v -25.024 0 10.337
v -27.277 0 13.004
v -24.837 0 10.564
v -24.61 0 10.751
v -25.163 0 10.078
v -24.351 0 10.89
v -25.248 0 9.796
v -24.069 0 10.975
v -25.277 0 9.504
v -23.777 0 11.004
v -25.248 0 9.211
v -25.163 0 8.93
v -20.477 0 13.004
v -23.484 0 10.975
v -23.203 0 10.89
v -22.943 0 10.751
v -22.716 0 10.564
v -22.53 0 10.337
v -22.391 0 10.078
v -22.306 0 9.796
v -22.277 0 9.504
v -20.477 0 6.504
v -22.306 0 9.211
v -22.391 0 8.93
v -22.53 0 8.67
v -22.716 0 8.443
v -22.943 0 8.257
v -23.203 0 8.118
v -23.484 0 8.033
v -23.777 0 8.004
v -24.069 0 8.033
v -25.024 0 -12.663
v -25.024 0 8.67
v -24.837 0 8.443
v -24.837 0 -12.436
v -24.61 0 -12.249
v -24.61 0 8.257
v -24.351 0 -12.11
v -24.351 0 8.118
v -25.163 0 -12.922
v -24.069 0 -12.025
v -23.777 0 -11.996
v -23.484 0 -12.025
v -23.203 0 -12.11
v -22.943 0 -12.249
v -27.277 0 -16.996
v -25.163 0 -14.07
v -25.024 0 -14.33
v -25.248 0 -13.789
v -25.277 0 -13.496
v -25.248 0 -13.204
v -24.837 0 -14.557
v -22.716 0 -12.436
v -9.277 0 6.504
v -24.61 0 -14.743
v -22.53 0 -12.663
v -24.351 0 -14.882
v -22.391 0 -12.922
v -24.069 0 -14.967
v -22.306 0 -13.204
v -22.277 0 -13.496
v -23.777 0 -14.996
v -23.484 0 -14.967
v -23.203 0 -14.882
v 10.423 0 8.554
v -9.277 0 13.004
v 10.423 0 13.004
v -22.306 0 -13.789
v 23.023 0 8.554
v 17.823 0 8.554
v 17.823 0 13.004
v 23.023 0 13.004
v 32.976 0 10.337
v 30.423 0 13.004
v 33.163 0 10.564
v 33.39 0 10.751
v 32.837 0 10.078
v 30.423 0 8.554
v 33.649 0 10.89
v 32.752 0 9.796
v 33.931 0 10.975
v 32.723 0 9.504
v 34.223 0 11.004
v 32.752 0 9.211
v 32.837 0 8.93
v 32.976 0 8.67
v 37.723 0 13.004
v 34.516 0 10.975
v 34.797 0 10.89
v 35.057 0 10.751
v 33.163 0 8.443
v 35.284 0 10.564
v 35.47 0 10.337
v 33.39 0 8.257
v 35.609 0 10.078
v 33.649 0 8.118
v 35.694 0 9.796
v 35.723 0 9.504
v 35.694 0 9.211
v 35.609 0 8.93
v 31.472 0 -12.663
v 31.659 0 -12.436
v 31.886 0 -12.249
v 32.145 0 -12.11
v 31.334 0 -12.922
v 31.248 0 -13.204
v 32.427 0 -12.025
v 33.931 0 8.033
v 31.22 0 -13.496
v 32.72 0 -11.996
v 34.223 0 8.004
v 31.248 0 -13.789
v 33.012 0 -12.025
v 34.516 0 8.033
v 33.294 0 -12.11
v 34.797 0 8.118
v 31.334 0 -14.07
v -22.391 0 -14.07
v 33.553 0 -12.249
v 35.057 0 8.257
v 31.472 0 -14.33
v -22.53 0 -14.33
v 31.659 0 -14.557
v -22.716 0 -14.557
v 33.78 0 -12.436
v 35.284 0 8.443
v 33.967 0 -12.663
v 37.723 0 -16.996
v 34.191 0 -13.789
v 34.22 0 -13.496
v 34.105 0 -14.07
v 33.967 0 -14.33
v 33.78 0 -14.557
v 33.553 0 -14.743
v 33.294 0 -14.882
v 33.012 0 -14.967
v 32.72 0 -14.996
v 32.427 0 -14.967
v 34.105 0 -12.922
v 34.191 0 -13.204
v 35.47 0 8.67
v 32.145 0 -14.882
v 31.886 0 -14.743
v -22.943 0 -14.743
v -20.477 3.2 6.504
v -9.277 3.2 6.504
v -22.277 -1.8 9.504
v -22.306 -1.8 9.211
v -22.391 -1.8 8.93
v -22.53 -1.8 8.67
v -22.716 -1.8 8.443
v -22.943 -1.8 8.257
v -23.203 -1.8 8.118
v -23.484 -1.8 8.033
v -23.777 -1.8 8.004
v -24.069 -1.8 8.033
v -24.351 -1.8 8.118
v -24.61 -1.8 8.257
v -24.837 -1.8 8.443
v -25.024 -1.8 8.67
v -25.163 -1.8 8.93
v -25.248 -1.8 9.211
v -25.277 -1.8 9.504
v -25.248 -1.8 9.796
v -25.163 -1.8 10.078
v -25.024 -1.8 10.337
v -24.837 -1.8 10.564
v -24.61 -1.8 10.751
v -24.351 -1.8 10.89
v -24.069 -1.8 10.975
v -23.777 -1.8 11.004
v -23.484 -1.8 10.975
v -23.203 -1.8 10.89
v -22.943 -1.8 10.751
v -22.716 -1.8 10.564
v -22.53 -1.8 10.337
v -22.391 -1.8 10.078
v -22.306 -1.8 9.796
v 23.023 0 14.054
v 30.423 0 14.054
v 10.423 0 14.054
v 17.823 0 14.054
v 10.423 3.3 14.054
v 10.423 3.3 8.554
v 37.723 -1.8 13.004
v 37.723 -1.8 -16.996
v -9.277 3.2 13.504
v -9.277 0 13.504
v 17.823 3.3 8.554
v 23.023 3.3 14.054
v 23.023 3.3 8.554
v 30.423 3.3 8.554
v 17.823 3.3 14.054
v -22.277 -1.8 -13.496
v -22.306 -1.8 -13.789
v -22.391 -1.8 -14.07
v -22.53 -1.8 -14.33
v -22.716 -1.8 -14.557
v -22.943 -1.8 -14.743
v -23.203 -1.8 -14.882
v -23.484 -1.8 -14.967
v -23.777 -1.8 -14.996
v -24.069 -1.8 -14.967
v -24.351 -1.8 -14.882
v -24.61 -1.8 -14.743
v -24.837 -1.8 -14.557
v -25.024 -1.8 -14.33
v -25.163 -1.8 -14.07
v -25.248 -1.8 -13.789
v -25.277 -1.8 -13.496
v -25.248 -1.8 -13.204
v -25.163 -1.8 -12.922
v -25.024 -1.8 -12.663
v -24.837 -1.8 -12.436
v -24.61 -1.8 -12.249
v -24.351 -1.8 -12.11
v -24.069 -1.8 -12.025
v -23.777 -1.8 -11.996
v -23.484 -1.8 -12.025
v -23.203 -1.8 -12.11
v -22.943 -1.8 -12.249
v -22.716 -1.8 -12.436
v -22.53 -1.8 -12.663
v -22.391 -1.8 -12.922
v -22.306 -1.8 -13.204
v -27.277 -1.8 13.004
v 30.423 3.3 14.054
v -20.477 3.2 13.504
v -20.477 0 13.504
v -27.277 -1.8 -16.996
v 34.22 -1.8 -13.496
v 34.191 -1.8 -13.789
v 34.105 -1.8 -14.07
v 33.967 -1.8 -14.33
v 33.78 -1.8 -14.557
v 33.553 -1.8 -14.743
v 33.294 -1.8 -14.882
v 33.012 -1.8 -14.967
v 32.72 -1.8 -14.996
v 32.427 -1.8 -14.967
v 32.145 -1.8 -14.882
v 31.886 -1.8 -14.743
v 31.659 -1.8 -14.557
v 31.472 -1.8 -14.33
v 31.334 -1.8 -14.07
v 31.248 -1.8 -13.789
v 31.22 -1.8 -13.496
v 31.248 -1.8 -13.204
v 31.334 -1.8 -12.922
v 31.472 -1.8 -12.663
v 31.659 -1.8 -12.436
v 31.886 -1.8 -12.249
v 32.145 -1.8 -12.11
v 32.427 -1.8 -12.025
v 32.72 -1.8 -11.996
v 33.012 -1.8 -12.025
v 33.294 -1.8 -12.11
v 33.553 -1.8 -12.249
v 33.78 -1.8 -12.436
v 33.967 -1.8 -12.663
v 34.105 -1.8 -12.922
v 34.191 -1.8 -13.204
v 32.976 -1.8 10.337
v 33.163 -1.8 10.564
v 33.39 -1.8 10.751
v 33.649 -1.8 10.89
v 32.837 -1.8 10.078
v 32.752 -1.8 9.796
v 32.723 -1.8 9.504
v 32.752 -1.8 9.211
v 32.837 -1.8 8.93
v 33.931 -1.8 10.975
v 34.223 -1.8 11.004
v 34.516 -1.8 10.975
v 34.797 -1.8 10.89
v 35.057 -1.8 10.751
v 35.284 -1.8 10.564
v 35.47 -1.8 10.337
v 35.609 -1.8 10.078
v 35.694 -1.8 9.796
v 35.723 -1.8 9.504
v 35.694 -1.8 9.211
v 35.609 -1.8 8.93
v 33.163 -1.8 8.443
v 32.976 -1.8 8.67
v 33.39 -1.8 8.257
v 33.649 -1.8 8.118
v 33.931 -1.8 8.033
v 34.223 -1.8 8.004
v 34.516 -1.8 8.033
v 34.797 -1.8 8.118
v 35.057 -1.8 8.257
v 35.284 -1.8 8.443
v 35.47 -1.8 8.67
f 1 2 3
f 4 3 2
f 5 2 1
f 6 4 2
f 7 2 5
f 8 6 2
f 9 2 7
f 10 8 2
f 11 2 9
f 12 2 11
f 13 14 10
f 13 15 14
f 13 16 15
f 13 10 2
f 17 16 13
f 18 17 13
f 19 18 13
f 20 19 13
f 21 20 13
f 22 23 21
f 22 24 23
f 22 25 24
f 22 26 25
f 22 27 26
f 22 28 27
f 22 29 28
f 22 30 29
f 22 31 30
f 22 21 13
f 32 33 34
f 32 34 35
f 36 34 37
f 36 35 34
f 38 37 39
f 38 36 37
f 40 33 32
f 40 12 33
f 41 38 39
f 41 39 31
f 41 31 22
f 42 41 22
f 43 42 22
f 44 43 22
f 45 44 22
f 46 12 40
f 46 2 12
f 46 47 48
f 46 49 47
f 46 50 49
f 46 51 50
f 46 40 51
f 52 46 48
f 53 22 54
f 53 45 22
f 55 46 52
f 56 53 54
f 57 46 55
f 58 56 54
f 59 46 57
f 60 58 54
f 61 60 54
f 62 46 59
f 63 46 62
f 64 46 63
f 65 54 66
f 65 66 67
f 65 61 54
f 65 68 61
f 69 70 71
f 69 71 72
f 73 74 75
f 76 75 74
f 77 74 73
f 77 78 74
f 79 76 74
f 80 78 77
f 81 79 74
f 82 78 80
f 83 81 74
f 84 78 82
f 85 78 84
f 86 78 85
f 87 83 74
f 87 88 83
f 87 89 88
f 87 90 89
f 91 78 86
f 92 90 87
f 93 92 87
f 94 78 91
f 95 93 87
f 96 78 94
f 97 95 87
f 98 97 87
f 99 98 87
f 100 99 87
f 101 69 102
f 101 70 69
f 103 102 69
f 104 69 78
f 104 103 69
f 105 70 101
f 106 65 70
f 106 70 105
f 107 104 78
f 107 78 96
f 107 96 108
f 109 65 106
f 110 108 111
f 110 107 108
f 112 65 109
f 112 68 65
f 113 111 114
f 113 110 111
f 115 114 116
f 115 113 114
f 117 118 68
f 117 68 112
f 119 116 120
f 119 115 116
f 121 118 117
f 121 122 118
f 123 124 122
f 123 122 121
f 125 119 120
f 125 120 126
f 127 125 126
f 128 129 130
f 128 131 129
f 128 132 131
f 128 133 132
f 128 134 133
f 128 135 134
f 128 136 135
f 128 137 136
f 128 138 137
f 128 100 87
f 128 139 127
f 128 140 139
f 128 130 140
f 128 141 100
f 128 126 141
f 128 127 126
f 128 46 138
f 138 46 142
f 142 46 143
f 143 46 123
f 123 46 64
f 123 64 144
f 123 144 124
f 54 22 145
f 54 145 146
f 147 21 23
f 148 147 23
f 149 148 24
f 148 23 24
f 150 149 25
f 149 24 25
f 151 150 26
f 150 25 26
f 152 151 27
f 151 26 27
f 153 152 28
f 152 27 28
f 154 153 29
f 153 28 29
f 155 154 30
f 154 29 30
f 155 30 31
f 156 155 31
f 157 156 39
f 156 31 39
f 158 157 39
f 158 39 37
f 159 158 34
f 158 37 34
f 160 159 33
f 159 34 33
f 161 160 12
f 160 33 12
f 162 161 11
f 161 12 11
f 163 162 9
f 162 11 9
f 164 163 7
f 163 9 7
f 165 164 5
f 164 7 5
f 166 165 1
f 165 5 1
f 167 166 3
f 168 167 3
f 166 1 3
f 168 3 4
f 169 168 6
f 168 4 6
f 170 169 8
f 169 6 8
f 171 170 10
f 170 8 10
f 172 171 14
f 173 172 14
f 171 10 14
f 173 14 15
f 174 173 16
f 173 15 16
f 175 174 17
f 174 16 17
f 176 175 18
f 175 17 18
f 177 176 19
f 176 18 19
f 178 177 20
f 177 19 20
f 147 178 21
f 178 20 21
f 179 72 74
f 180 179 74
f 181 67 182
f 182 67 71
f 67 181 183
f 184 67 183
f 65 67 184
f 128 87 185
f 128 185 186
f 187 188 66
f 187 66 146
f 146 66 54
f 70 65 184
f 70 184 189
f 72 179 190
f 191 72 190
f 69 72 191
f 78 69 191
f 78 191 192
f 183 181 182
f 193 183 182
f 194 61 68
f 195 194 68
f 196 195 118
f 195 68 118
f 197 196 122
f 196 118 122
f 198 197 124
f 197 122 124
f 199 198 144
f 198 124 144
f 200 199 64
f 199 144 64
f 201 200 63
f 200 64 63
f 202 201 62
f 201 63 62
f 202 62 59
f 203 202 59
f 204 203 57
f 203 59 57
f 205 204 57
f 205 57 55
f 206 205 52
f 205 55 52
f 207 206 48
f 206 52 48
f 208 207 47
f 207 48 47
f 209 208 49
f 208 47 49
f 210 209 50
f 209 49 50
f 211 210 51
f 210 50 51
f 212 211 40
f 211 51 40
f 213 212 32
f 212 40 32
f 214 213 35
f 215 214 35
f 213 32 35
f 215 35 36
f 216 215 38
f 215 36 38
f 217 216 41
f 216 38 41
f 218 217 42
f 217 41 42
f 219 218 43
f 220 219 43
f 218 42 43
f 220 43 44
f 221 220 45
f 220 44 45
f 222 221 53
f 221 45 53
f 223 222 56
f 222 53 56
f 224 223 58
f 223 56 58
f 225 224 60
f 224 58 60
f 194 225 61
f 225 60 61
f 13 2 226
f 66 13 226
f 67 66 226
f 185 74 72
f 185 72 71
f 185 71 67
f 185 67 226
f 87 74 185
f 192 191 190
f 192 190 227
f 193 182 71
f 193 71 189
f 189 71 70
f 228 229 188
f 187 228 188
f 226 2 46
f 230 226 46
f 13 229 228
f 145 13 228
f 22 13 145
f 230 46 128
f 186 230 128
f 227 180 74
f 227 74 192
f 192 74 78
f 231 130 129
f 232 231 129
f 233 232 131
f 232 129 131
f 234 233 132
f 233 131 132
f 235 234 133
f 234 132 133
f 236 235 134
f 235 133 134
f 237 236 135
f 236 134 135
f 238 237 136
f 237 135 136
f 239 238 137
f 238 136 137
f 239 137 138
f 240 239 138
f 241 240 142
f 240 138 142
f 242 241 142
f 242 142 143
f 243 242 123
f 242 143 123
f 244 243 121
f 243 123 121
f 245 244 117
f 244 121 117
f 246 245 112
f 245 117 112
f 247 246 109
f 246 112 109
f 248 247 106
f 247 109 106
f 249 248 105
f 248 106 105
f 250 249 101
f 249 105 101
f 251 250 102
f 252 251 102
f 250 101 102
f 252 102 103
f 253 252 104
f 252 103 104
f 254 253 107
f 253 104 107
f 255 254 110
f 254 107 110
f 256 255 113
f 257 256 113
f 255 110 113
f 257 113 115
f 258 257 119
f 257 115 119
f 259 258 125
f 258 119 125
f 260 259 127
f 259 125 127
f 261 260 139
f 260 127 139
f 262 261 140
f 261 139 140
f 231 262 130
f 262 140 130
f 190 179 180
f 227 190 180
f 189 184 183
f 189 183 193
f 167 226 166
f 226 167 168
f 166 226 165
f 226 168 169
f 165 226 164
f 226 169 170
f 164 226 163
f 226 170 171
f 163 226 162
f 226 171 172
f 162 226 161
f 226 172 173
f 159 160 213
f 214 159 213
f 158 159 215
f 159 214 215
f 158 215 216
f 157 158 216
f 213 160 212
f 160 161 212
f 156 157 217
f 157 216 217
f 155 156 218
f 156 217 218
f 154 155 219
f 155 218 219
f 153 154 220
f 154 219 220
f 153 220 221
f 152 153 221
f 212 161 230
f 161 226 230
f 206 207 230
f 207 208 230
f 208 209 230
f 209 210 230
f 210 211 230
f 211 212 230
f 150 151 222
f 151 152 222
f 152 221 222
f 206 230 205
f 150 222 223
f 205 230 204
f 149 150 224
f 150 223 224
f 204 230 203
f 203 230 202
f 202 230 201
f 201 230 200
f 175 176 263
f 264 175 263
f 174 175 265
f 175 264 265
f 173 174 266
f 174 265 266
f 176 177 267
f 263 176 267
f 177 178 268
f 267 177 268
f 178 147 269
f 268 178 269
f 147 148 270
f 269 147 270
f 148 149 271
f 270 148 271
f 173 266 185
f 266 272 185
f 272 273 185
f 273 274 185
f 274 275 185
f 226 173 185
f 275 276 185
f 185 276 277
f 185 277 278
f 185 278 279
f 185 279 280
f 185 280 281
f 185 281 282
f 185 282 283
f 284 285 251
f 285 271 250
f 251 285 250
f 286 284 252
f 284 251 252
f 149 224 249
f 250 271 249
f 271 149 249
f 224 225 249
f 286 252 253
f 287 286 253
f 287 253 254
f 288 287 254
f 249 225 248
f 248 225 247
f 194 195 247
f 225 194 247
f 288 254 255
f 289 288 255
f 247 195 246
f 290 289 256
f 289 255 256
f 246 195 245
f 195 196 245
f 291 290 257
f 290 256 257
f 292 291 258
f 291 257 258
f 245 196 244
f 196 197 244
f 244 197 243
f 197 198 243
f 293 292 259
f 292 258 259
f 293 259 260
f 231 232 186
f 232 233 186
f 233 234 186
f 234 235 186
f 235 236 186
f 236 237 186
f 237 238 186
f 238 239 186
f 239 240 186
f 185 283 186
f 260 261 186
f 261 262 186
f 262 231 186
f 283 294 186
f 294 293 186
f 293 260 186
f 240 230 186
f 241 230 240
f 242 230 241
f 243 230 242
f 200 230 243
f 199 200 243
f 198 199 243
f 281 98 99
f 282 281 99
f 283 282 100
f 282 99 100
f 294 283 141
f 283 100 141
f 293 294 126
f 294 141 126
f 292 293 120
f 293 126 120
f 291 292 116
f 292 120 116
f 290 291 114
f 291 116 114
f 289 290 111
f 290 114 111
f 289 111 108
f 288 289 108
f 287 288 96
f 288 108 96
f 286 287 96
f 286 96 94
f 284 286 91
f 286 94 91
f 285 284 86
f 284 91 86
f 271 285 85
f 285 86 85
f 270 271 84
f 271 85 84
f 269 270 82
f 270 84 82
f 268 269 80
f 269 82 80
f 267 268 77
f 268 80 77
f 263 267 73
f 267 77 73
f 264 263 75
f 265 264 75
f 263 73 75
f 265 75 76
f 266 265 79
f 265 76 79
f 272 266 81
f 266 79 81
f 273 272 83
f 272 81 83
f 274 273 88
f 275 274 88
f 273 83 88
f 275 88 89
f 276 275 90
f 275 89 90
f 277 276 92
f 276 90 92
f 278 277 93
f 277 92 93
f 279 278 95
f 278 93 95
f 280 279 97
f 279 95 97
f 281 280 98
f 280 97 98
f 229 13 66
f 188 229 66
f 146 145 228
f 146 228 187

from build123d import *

# Parameters (mm, degrees)
SKETCH4_W           = 65
SKETCH4_H           = 30
SKETCH4_R           = 1.5
BOSS_EXTRUDE1_DEPTH = 1.8
SKETCH5_W           = 11.2
SKETCH5_H           = 7
BOSS_EXTRUDE2_DEPTH = 3.2
SKETCH6_W           = 7.4
SKETCH6_H           = 5.5
BOSS_EXTRUDE3_DEPTH = 3.3


with BuildPart() as part:
    # Sketch4 → Boss-Extrude1 (new body)
    with BuildSketch(Plane(origin=(0, 0, 0), x_dir=(1, 0, 0), z_dir=(0, 1, 0))):
        with Locations((5.223214286, 1.996173469)):
            Rectangle(SKETCH4_W, SKETCH4_H)
        with Locations((-23.776785714, 13.496173469)):
            Circle(SKETCH4_R, mode=Mode.SUBTRACT)
        with Locations((32.719505344, 13.496173469)):
            Circle(SKETCH4_R, mode=Mode.SUBTRACT)
        with Locations((34.223214286, -9.503826531)):
            Circle(SKETCH4_R, mode=Mode.SUBTRACT)
        with Locations((-23.776785714, -9.503826531)):
            Circle(SKETCH4_R, mode=Mode.SUBTRACT)
    extrude(amount=-BOSS_EXTRUDE1_DEPTH)

    # Sketch5 → Boss-Extrude2 (add)
    with BuildSketch(Plane(origin=(0, 0, 0), x_dir=(1, 0, 0), z_dir=(0, 1, 0))):
        with Locations((-14.876785714, -10.003826531)):
            Rectangle(SKETCH5_W, SKETCH5_H)
    extrude(amount=BOSS_EXTRUDE2_DEPTH)

    # Sketch6 → Boss-Extrude3 (add)
    with BuildSketch(Plane(origin=(0, 0, 0), x_dir=(1, 0, 0), z_dir=(0, 1, 0))):
        with Locations((14.123214286, -11.303826531)):
            Rectangle(SKETCH6_W, SKETCH6_H)
        with Locations((26.723214286, -11.303826531)):
            Rectangle(SKETCH6_W, SKETCH6_H)
    extrude(amount=BOSS_EXTRUDE3_DEPTH)


solid = part.part
